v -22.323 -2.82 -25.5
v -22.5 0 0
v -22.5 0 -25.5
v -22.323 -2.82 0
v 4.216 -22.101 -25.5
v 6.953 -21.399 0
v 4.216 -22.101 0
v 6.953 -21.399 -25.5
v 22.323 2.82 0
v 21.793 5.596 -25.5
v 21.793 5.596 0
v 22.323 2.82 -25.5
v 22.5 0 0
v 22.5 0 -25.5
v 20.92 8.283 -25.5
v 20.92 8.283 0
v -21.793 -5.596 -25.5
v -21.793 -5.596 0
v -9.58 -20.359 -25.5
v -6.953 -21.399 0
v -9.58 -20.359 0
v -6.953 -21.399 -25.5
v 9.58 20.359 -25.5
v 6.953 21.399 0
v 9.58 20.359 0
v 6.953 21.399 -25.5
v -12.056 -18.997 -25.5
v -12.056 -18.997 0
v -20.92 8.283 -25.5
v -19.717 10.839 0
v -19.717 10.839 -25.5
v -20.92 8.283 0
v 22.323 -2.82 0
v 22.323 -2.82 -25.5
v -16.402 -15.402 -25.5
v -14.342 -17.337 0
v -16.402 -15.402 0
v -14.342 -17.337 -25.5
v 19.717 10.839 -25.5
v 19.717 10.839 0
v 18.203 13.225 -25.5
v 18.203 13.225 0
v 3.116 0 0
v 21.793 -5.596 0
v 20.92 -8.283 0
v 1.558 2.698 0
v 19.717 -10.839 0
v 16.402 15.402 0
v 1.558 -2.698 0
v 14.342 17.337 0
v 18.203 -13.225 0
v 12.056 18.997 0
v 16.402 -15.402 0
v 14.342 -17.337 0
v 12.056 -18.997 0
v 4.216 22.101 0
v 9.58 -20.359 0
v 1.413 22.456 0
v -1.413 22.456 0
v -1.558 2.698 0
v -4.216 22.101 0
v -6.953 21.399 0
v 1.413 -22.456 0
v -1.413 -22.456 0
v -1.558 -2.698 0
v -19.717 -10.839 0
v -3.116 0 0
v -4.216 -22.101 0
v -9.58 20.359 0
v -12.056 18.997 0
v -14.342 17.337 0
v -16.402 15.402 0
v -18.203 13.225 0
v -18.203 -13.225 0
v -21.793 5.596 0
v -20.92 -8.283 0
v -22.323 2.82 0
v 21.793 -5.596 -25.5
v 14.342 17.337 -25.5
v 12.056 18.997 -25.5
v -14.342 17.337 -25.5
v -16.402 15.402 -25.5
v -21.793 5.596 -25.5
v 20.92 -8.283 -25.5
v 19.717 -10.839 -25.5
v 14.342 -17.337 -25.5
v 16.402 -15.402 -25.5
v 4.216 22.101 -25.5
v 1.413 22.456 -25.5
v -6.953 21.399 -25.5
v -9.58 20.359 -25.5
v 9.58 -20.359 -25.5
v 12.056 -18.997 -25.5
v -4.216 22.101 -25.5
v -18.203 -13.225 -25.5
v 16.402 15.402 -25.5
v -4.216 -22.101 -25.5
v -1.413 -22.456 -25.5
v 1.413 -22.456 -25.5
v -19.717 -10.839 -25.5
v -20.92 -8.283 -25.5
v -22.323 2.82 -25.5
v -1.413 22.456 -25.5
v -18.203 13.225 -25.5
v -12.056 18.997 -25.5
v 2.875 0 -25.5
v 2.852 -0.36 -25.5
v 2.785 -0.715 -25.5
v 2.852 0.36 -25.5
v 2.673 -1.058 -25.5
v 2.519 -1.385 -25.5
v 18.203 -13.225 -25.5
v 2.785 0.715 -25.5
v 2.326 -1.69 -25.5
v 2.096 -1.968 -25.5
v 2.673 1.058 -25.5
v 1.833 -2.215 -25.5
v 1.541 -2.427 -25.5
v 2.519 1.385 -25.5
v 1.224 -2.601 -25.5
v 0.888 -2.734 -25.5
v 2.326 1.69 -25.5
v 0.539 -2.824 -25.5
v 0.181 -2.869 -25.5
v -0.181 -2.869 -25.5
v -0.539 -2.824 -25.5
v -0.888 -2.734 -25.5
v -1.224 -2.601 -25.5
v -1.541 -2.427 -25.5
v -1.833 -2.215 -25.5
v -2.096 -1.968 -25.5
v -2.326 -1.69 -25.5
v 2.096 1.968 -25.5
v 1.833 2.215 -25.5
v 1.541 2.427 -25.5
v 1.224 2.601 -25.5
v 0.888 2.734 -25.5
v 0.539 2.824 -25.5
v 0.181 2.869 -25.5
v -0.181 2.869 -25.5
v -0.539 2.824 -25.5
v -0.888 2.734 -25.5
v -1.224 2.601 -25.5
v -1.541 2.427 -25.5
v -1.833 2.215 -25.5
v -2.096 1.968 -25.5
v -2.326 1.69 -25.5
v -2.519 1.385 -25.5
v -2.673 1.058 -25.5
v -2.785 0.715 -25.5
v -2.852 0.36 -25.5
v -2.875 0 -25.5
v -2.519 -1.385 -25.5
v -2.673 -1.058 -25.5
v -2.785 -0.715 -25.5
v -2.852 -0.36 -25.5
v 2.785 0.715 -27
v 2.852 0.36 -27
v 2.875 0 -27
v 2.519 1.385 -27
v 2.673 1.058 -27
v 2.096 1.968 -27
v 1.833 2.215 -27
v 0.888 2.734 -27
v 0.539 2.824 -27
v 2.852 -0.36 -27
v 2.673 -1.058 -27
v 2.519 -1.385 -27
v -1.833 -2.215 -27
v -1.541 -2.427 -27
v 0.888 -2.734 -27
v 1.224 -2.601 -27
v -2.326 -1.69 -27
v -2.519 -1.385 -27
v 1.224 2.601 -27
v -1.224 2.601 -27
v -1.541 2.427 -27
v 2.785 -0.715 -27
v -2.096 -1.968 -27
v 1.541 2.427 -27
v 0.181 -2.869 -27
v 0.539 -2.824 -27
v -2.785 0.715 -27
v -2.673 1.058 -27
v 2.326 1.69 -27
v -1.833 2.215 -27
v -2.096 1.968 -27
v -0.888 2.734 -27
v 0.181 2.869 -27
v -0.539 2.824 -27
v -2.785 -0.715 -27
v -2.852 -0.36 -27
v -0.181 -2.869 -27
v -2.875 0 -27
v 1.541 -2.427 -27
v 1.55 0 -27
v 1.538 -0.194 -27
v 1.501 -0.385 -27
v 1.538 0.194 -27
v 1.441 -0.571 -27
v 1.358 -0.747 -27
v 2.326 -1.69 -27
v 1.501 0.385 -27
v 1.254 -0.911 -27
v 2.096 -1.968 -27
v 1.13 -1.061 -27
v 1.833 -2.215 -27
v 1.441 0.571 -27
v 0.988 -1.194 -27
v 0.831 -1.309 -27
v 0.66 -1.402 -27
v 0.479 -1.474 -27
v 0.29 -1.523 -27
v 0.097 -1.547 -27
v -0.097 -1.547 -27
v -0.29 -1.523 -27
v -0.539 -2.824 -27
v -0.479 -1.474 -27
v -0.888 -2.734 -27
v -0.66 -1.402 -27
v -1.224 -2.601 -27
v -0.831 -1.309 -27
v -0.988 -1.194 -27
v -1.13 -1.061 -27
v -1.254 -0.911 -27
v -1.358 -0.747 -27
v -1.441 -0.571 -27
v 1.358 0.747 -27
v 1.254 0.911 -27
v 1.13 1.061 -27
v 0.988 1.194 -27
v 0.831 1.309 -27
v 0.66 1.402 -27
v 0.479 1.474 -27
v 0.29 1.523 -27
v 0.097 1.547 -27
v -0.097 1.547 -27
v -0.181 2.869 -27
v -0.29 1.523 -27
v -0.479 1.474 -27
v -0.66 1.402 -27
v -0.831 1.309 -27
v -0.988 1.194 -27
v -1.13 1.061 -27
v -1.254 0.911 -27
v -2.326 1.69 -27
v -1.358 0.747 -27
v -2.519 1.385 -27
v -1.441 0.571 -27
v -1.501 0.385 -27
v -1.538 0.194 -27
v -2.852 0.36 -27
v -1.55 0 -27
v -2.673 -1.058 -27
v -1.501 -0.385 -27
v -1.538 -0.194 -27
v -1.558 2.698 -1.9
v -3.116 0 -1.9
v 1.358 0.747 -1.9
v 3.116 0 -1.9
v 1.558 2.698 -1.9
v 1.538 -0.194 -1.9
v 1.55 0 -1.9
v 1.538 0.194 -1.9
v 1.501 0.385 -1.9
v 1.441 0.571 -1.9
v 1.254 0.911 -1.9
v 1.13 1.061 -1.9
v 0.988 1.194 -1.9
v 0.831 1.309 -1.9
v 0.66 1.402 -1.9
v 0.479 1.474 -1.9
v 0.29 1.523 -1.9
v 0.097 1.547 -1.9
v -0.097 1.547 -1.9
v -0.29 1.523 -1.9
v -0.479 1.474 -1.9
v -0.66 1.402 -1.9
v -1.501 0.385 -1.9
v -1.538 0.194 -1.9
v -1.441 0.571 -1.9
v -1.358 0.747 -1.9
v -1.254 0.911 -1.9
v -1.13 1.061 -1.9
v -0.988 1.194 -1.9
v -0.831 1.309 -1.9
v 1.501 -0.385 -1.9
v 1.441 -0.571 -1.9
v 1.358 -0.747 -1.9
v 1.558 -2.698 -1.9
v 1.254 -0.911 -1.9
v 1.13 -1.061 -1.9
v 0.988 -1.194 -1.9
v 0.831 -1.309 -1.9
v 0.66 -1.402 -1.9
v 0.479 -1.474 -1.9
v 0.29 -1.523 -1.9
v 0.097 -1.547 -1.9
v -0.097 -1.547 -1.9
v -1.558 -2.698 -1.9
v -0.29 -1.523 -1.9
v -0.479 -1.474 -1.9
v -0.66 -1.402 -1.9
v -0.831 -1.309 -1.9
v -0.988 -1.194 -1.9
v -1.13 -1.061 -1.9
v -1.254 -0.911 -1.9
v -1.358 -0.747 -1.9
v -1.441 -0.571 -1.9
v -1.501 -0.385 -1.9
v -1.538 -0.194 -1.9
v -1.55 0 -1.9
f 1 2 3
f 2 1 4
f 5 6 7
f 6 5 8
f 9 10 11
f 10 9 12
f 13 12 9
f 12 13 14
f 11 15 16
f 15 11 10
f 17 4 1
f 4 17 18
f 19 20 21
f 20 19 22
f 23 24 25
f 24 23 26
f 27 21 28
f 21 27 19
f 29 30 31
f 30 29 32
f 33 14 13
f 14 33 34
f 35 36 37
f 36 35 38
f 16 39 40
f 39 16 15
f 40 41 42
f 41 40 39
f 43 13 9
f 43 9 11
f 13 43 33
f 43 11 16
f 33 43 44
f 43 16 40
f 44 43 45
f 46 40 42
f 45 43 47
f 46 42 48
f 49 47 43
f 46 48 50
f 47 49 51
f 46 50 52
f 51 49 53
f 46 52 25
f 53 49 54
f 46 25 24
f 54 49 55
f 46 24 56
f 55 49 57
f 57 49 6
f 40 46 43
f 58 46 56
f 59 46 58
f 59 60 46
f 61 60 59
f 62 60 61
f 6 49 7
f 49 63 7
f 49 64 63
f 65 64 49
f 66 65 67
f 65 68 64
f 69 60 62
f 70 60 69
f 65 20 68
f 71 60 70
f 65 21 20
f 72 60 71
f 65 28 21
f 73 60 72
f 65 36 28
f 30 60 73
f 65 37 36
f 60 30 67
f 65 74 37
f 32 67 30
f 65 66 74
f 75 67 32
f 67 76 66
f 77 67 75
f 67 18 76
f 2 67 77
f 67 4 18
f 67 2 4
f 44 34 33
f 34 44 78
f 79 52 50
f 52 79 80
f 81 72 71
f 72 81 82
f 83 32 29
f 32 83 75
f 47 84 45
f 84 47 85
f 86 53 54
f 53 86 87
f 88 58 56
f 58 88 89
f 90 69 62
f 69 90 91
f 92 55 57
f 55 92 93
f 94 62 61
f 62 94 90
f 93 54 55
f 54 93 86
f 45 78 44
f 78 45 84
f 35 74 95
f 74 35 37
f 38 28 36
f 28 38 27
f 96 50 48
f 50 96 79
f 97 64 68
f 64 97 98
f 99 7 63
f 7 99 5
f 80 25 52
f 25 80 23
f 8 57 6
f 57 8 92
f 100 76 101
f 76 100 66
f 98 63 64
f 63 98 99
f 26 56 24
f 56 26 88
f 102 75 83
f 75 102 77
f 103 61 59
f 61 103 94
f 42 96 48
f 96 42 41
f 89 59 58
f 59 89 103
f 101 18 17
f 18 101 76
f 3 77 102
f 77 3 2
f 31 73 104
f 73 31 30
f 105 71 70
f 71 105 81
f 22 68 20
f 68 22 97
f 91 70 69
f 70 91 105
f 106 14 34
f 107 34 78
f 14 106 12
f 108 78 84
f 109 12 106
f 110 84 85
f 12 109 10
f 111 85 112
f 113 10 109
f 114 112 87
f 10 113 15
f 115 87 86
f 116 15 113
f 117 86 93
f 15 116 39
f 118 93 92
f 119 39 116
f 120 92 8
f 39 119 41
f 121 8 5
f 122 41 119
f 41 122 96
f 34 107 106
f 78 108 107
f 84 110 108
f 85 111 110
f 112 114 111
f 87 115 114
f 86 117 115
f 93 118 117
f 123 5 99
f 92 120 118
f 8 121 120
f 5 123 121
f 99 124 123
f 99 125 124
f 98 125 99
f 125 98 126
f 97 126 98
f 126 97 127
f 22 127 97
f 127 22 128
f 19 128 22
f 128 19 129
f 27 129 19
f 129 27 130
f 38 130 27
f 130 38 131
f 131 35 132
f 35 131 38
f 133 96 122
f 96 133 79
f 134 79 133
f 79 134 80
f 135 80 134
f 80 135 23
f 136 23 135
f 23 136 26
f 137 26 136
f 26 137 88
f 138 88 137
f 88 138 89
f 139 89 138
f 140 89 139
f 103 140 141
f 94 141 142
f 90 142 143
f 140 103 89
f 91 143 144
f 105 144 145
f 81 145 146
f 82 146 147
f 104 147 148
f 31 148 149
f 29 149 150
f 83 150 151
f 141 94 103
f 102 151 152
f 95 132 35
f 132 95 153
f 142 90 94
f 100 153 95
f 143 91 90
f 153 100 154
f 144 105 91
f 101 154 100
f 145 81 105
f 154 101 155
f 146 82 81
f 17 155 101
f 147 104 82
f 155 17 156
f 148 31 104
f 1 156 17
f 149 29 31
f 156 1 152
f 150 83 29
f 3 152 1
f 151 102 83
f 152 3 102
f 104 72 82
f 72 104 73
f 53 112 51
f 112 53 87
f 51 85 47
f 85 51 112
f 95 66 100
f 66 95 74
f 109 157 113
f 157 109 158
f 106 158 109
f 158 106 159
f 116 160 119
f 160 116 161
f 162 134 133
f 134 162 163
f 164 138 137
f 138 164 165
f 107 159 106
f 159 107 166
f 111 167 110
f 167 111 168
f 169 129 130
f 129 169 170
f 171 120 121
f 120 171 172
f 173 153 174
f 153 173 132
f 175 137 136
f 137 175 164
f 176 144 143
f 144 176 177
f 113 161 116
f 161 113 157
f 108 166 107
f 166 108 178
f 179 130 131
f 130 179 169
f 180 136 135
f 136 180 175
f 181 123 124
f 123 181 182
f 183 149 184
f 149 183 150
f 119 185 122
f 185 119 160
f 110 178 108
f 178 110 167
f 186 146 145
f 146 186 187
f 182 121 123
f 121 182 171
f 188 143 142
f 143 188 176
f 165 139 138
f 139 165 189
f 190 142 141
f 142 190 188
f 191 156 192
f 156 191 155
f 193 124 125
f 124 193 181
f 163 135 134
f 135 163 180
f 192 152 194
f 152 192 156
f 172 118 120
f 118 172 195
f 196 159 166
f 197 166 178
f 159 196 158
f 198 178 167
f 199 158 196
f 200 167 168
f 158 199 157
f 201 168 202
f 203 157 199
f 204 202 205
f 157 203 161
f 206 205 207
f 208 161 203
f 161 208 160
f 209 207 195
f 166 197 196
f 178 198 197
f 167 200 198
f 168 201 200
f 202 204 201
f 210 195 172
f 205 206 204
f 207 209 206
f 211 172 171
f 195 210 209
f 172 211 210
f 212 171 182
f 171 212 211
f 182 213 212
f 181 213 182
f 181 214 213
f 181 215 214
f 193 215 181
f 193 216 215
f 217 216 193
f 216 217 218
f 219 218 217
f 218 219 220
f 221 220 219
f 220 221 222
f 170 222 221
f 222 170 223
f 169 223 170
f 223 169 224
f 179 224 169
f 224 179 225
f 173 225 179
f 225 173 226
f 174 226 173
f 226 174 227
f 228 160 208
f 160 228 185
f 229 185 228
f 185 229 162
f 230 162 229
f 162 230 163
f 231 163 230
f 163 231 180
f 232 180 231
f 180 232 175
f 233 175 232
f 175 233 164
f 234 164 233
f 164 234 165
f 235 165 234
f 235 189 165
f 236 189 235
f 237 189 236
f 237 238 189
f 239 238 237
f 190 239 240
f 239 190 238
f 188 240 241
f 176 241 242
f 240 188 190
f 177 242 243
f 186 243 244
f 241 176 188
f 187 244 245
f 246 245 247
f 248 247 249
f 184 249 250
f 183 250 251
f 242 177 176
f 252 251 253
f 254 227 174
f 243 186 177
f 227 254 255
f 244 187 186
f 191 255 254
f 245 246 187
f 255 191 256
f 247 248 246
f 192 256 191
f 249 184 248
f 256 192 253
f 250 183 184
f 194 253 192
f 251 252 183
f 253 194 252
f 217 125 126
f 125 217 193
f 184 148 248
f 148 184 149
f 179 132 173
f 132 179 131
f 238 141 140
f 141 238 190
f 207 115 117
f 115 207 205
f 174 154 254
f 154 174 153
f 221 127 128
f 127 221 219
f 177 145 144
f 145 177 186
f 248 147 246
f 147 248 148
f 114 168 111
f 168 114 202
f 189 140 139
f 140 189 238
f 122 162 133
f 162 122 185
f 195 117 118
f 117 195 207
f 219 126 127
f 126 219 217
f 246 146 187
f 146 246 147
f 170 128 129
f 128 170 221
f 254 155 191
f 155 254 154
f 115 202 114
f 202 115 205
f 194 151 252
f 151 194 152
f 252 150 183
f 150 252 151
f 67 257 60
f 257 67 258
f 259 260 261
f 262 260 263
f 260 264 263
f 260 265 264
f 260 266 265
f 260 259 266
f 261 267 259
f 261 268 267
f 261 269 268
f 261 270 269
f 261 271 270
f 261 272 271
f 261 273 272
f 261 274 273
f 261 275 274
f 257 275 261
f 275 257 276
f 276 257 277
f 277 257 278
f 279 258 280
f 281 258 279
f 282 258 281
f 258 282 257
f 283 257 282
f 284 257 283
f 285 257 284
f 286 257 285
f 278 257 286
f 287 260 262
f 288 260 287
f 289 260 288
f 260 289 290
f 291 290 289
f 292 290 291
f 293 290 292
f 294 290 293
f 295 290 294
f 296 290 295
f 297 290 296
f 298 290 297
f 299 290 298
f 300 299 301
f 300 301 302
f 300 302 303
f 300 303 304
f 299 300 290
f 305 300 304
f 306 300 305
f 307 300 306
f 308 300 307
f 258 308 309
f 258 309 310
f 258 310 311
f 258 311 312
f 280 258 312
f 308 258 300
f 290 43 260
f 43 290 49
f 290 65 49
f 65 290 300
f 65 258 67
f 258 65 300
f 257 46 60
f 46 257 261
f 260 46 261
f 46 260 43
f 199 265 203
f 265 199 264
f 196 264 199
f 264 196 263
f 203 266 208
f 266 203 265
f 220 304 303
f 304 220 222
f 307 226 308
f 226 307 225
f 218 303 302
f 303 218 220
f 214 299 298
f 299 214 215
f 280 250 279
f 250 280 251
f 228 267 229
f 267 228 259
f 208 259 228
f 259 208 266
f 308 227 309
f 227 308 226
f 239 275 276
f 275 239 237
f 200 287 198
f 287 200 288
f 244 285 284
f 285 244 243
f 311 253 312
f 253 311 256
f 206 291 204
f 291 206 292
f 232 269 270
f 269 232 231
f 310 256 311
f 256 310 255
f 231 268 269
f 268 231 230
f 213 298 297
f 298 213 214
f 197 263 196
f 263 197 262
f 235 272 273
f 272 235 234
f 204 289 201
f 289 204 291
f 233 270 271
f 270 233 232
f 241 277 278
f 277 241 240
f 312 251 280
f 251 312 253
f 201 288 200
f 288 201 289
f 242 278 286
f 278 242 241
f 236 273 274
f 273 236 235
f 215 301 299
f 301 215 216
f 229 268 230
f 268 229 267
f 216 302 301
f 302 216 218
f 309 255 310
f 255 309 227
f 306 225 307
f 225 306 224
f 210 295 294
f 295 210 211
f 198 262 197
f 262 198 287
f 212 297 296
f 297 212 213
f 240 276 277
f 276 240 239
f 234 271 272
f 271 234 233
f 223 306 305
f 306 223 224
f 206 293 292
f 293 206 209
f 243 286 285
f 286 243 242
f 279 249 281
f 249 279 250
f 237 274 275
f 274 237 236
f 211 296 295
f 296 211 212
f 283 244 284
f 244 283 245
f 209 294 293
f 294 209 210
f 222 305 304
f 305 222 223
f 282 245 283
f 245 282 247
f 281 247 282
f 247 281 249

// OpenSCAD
$fn = 50;

difference() {
	union() {
		translate(v = [0, 0, -25.5]) {
			cylinder(h = 25.5, r = 22.5);
		}
		#translate(v = [0, 0, -27.0]) {
			cylinder(h = 27, r = 2.875);
		}
	}
	union() {
		translate(v = [0, 0, 0]) {
			rotate(a = [0, 0, 0]) {
				difference() {
					union() {
						translate(v = [0, 0, -1.9]) {
							linear_extrude(height = 1.9) {
								polygon(points = [[3.1158, 0.0], [1.5579000000000005, 2.698361953111554], [-1.5578999999999994, 2.6983619531115544], [-3.1158, 3.815754496783323e-16], [-1.5579000000000014, -2.6983619531115535], [1.557899999999998, -2.6983619531115552]]);
							}
						}
					}
					union();
				}
			}
		}
		#translate(v = [0, 0, -100.0]) {
			cylinder(h = 200, r = 1.55);
		}
	}
}
